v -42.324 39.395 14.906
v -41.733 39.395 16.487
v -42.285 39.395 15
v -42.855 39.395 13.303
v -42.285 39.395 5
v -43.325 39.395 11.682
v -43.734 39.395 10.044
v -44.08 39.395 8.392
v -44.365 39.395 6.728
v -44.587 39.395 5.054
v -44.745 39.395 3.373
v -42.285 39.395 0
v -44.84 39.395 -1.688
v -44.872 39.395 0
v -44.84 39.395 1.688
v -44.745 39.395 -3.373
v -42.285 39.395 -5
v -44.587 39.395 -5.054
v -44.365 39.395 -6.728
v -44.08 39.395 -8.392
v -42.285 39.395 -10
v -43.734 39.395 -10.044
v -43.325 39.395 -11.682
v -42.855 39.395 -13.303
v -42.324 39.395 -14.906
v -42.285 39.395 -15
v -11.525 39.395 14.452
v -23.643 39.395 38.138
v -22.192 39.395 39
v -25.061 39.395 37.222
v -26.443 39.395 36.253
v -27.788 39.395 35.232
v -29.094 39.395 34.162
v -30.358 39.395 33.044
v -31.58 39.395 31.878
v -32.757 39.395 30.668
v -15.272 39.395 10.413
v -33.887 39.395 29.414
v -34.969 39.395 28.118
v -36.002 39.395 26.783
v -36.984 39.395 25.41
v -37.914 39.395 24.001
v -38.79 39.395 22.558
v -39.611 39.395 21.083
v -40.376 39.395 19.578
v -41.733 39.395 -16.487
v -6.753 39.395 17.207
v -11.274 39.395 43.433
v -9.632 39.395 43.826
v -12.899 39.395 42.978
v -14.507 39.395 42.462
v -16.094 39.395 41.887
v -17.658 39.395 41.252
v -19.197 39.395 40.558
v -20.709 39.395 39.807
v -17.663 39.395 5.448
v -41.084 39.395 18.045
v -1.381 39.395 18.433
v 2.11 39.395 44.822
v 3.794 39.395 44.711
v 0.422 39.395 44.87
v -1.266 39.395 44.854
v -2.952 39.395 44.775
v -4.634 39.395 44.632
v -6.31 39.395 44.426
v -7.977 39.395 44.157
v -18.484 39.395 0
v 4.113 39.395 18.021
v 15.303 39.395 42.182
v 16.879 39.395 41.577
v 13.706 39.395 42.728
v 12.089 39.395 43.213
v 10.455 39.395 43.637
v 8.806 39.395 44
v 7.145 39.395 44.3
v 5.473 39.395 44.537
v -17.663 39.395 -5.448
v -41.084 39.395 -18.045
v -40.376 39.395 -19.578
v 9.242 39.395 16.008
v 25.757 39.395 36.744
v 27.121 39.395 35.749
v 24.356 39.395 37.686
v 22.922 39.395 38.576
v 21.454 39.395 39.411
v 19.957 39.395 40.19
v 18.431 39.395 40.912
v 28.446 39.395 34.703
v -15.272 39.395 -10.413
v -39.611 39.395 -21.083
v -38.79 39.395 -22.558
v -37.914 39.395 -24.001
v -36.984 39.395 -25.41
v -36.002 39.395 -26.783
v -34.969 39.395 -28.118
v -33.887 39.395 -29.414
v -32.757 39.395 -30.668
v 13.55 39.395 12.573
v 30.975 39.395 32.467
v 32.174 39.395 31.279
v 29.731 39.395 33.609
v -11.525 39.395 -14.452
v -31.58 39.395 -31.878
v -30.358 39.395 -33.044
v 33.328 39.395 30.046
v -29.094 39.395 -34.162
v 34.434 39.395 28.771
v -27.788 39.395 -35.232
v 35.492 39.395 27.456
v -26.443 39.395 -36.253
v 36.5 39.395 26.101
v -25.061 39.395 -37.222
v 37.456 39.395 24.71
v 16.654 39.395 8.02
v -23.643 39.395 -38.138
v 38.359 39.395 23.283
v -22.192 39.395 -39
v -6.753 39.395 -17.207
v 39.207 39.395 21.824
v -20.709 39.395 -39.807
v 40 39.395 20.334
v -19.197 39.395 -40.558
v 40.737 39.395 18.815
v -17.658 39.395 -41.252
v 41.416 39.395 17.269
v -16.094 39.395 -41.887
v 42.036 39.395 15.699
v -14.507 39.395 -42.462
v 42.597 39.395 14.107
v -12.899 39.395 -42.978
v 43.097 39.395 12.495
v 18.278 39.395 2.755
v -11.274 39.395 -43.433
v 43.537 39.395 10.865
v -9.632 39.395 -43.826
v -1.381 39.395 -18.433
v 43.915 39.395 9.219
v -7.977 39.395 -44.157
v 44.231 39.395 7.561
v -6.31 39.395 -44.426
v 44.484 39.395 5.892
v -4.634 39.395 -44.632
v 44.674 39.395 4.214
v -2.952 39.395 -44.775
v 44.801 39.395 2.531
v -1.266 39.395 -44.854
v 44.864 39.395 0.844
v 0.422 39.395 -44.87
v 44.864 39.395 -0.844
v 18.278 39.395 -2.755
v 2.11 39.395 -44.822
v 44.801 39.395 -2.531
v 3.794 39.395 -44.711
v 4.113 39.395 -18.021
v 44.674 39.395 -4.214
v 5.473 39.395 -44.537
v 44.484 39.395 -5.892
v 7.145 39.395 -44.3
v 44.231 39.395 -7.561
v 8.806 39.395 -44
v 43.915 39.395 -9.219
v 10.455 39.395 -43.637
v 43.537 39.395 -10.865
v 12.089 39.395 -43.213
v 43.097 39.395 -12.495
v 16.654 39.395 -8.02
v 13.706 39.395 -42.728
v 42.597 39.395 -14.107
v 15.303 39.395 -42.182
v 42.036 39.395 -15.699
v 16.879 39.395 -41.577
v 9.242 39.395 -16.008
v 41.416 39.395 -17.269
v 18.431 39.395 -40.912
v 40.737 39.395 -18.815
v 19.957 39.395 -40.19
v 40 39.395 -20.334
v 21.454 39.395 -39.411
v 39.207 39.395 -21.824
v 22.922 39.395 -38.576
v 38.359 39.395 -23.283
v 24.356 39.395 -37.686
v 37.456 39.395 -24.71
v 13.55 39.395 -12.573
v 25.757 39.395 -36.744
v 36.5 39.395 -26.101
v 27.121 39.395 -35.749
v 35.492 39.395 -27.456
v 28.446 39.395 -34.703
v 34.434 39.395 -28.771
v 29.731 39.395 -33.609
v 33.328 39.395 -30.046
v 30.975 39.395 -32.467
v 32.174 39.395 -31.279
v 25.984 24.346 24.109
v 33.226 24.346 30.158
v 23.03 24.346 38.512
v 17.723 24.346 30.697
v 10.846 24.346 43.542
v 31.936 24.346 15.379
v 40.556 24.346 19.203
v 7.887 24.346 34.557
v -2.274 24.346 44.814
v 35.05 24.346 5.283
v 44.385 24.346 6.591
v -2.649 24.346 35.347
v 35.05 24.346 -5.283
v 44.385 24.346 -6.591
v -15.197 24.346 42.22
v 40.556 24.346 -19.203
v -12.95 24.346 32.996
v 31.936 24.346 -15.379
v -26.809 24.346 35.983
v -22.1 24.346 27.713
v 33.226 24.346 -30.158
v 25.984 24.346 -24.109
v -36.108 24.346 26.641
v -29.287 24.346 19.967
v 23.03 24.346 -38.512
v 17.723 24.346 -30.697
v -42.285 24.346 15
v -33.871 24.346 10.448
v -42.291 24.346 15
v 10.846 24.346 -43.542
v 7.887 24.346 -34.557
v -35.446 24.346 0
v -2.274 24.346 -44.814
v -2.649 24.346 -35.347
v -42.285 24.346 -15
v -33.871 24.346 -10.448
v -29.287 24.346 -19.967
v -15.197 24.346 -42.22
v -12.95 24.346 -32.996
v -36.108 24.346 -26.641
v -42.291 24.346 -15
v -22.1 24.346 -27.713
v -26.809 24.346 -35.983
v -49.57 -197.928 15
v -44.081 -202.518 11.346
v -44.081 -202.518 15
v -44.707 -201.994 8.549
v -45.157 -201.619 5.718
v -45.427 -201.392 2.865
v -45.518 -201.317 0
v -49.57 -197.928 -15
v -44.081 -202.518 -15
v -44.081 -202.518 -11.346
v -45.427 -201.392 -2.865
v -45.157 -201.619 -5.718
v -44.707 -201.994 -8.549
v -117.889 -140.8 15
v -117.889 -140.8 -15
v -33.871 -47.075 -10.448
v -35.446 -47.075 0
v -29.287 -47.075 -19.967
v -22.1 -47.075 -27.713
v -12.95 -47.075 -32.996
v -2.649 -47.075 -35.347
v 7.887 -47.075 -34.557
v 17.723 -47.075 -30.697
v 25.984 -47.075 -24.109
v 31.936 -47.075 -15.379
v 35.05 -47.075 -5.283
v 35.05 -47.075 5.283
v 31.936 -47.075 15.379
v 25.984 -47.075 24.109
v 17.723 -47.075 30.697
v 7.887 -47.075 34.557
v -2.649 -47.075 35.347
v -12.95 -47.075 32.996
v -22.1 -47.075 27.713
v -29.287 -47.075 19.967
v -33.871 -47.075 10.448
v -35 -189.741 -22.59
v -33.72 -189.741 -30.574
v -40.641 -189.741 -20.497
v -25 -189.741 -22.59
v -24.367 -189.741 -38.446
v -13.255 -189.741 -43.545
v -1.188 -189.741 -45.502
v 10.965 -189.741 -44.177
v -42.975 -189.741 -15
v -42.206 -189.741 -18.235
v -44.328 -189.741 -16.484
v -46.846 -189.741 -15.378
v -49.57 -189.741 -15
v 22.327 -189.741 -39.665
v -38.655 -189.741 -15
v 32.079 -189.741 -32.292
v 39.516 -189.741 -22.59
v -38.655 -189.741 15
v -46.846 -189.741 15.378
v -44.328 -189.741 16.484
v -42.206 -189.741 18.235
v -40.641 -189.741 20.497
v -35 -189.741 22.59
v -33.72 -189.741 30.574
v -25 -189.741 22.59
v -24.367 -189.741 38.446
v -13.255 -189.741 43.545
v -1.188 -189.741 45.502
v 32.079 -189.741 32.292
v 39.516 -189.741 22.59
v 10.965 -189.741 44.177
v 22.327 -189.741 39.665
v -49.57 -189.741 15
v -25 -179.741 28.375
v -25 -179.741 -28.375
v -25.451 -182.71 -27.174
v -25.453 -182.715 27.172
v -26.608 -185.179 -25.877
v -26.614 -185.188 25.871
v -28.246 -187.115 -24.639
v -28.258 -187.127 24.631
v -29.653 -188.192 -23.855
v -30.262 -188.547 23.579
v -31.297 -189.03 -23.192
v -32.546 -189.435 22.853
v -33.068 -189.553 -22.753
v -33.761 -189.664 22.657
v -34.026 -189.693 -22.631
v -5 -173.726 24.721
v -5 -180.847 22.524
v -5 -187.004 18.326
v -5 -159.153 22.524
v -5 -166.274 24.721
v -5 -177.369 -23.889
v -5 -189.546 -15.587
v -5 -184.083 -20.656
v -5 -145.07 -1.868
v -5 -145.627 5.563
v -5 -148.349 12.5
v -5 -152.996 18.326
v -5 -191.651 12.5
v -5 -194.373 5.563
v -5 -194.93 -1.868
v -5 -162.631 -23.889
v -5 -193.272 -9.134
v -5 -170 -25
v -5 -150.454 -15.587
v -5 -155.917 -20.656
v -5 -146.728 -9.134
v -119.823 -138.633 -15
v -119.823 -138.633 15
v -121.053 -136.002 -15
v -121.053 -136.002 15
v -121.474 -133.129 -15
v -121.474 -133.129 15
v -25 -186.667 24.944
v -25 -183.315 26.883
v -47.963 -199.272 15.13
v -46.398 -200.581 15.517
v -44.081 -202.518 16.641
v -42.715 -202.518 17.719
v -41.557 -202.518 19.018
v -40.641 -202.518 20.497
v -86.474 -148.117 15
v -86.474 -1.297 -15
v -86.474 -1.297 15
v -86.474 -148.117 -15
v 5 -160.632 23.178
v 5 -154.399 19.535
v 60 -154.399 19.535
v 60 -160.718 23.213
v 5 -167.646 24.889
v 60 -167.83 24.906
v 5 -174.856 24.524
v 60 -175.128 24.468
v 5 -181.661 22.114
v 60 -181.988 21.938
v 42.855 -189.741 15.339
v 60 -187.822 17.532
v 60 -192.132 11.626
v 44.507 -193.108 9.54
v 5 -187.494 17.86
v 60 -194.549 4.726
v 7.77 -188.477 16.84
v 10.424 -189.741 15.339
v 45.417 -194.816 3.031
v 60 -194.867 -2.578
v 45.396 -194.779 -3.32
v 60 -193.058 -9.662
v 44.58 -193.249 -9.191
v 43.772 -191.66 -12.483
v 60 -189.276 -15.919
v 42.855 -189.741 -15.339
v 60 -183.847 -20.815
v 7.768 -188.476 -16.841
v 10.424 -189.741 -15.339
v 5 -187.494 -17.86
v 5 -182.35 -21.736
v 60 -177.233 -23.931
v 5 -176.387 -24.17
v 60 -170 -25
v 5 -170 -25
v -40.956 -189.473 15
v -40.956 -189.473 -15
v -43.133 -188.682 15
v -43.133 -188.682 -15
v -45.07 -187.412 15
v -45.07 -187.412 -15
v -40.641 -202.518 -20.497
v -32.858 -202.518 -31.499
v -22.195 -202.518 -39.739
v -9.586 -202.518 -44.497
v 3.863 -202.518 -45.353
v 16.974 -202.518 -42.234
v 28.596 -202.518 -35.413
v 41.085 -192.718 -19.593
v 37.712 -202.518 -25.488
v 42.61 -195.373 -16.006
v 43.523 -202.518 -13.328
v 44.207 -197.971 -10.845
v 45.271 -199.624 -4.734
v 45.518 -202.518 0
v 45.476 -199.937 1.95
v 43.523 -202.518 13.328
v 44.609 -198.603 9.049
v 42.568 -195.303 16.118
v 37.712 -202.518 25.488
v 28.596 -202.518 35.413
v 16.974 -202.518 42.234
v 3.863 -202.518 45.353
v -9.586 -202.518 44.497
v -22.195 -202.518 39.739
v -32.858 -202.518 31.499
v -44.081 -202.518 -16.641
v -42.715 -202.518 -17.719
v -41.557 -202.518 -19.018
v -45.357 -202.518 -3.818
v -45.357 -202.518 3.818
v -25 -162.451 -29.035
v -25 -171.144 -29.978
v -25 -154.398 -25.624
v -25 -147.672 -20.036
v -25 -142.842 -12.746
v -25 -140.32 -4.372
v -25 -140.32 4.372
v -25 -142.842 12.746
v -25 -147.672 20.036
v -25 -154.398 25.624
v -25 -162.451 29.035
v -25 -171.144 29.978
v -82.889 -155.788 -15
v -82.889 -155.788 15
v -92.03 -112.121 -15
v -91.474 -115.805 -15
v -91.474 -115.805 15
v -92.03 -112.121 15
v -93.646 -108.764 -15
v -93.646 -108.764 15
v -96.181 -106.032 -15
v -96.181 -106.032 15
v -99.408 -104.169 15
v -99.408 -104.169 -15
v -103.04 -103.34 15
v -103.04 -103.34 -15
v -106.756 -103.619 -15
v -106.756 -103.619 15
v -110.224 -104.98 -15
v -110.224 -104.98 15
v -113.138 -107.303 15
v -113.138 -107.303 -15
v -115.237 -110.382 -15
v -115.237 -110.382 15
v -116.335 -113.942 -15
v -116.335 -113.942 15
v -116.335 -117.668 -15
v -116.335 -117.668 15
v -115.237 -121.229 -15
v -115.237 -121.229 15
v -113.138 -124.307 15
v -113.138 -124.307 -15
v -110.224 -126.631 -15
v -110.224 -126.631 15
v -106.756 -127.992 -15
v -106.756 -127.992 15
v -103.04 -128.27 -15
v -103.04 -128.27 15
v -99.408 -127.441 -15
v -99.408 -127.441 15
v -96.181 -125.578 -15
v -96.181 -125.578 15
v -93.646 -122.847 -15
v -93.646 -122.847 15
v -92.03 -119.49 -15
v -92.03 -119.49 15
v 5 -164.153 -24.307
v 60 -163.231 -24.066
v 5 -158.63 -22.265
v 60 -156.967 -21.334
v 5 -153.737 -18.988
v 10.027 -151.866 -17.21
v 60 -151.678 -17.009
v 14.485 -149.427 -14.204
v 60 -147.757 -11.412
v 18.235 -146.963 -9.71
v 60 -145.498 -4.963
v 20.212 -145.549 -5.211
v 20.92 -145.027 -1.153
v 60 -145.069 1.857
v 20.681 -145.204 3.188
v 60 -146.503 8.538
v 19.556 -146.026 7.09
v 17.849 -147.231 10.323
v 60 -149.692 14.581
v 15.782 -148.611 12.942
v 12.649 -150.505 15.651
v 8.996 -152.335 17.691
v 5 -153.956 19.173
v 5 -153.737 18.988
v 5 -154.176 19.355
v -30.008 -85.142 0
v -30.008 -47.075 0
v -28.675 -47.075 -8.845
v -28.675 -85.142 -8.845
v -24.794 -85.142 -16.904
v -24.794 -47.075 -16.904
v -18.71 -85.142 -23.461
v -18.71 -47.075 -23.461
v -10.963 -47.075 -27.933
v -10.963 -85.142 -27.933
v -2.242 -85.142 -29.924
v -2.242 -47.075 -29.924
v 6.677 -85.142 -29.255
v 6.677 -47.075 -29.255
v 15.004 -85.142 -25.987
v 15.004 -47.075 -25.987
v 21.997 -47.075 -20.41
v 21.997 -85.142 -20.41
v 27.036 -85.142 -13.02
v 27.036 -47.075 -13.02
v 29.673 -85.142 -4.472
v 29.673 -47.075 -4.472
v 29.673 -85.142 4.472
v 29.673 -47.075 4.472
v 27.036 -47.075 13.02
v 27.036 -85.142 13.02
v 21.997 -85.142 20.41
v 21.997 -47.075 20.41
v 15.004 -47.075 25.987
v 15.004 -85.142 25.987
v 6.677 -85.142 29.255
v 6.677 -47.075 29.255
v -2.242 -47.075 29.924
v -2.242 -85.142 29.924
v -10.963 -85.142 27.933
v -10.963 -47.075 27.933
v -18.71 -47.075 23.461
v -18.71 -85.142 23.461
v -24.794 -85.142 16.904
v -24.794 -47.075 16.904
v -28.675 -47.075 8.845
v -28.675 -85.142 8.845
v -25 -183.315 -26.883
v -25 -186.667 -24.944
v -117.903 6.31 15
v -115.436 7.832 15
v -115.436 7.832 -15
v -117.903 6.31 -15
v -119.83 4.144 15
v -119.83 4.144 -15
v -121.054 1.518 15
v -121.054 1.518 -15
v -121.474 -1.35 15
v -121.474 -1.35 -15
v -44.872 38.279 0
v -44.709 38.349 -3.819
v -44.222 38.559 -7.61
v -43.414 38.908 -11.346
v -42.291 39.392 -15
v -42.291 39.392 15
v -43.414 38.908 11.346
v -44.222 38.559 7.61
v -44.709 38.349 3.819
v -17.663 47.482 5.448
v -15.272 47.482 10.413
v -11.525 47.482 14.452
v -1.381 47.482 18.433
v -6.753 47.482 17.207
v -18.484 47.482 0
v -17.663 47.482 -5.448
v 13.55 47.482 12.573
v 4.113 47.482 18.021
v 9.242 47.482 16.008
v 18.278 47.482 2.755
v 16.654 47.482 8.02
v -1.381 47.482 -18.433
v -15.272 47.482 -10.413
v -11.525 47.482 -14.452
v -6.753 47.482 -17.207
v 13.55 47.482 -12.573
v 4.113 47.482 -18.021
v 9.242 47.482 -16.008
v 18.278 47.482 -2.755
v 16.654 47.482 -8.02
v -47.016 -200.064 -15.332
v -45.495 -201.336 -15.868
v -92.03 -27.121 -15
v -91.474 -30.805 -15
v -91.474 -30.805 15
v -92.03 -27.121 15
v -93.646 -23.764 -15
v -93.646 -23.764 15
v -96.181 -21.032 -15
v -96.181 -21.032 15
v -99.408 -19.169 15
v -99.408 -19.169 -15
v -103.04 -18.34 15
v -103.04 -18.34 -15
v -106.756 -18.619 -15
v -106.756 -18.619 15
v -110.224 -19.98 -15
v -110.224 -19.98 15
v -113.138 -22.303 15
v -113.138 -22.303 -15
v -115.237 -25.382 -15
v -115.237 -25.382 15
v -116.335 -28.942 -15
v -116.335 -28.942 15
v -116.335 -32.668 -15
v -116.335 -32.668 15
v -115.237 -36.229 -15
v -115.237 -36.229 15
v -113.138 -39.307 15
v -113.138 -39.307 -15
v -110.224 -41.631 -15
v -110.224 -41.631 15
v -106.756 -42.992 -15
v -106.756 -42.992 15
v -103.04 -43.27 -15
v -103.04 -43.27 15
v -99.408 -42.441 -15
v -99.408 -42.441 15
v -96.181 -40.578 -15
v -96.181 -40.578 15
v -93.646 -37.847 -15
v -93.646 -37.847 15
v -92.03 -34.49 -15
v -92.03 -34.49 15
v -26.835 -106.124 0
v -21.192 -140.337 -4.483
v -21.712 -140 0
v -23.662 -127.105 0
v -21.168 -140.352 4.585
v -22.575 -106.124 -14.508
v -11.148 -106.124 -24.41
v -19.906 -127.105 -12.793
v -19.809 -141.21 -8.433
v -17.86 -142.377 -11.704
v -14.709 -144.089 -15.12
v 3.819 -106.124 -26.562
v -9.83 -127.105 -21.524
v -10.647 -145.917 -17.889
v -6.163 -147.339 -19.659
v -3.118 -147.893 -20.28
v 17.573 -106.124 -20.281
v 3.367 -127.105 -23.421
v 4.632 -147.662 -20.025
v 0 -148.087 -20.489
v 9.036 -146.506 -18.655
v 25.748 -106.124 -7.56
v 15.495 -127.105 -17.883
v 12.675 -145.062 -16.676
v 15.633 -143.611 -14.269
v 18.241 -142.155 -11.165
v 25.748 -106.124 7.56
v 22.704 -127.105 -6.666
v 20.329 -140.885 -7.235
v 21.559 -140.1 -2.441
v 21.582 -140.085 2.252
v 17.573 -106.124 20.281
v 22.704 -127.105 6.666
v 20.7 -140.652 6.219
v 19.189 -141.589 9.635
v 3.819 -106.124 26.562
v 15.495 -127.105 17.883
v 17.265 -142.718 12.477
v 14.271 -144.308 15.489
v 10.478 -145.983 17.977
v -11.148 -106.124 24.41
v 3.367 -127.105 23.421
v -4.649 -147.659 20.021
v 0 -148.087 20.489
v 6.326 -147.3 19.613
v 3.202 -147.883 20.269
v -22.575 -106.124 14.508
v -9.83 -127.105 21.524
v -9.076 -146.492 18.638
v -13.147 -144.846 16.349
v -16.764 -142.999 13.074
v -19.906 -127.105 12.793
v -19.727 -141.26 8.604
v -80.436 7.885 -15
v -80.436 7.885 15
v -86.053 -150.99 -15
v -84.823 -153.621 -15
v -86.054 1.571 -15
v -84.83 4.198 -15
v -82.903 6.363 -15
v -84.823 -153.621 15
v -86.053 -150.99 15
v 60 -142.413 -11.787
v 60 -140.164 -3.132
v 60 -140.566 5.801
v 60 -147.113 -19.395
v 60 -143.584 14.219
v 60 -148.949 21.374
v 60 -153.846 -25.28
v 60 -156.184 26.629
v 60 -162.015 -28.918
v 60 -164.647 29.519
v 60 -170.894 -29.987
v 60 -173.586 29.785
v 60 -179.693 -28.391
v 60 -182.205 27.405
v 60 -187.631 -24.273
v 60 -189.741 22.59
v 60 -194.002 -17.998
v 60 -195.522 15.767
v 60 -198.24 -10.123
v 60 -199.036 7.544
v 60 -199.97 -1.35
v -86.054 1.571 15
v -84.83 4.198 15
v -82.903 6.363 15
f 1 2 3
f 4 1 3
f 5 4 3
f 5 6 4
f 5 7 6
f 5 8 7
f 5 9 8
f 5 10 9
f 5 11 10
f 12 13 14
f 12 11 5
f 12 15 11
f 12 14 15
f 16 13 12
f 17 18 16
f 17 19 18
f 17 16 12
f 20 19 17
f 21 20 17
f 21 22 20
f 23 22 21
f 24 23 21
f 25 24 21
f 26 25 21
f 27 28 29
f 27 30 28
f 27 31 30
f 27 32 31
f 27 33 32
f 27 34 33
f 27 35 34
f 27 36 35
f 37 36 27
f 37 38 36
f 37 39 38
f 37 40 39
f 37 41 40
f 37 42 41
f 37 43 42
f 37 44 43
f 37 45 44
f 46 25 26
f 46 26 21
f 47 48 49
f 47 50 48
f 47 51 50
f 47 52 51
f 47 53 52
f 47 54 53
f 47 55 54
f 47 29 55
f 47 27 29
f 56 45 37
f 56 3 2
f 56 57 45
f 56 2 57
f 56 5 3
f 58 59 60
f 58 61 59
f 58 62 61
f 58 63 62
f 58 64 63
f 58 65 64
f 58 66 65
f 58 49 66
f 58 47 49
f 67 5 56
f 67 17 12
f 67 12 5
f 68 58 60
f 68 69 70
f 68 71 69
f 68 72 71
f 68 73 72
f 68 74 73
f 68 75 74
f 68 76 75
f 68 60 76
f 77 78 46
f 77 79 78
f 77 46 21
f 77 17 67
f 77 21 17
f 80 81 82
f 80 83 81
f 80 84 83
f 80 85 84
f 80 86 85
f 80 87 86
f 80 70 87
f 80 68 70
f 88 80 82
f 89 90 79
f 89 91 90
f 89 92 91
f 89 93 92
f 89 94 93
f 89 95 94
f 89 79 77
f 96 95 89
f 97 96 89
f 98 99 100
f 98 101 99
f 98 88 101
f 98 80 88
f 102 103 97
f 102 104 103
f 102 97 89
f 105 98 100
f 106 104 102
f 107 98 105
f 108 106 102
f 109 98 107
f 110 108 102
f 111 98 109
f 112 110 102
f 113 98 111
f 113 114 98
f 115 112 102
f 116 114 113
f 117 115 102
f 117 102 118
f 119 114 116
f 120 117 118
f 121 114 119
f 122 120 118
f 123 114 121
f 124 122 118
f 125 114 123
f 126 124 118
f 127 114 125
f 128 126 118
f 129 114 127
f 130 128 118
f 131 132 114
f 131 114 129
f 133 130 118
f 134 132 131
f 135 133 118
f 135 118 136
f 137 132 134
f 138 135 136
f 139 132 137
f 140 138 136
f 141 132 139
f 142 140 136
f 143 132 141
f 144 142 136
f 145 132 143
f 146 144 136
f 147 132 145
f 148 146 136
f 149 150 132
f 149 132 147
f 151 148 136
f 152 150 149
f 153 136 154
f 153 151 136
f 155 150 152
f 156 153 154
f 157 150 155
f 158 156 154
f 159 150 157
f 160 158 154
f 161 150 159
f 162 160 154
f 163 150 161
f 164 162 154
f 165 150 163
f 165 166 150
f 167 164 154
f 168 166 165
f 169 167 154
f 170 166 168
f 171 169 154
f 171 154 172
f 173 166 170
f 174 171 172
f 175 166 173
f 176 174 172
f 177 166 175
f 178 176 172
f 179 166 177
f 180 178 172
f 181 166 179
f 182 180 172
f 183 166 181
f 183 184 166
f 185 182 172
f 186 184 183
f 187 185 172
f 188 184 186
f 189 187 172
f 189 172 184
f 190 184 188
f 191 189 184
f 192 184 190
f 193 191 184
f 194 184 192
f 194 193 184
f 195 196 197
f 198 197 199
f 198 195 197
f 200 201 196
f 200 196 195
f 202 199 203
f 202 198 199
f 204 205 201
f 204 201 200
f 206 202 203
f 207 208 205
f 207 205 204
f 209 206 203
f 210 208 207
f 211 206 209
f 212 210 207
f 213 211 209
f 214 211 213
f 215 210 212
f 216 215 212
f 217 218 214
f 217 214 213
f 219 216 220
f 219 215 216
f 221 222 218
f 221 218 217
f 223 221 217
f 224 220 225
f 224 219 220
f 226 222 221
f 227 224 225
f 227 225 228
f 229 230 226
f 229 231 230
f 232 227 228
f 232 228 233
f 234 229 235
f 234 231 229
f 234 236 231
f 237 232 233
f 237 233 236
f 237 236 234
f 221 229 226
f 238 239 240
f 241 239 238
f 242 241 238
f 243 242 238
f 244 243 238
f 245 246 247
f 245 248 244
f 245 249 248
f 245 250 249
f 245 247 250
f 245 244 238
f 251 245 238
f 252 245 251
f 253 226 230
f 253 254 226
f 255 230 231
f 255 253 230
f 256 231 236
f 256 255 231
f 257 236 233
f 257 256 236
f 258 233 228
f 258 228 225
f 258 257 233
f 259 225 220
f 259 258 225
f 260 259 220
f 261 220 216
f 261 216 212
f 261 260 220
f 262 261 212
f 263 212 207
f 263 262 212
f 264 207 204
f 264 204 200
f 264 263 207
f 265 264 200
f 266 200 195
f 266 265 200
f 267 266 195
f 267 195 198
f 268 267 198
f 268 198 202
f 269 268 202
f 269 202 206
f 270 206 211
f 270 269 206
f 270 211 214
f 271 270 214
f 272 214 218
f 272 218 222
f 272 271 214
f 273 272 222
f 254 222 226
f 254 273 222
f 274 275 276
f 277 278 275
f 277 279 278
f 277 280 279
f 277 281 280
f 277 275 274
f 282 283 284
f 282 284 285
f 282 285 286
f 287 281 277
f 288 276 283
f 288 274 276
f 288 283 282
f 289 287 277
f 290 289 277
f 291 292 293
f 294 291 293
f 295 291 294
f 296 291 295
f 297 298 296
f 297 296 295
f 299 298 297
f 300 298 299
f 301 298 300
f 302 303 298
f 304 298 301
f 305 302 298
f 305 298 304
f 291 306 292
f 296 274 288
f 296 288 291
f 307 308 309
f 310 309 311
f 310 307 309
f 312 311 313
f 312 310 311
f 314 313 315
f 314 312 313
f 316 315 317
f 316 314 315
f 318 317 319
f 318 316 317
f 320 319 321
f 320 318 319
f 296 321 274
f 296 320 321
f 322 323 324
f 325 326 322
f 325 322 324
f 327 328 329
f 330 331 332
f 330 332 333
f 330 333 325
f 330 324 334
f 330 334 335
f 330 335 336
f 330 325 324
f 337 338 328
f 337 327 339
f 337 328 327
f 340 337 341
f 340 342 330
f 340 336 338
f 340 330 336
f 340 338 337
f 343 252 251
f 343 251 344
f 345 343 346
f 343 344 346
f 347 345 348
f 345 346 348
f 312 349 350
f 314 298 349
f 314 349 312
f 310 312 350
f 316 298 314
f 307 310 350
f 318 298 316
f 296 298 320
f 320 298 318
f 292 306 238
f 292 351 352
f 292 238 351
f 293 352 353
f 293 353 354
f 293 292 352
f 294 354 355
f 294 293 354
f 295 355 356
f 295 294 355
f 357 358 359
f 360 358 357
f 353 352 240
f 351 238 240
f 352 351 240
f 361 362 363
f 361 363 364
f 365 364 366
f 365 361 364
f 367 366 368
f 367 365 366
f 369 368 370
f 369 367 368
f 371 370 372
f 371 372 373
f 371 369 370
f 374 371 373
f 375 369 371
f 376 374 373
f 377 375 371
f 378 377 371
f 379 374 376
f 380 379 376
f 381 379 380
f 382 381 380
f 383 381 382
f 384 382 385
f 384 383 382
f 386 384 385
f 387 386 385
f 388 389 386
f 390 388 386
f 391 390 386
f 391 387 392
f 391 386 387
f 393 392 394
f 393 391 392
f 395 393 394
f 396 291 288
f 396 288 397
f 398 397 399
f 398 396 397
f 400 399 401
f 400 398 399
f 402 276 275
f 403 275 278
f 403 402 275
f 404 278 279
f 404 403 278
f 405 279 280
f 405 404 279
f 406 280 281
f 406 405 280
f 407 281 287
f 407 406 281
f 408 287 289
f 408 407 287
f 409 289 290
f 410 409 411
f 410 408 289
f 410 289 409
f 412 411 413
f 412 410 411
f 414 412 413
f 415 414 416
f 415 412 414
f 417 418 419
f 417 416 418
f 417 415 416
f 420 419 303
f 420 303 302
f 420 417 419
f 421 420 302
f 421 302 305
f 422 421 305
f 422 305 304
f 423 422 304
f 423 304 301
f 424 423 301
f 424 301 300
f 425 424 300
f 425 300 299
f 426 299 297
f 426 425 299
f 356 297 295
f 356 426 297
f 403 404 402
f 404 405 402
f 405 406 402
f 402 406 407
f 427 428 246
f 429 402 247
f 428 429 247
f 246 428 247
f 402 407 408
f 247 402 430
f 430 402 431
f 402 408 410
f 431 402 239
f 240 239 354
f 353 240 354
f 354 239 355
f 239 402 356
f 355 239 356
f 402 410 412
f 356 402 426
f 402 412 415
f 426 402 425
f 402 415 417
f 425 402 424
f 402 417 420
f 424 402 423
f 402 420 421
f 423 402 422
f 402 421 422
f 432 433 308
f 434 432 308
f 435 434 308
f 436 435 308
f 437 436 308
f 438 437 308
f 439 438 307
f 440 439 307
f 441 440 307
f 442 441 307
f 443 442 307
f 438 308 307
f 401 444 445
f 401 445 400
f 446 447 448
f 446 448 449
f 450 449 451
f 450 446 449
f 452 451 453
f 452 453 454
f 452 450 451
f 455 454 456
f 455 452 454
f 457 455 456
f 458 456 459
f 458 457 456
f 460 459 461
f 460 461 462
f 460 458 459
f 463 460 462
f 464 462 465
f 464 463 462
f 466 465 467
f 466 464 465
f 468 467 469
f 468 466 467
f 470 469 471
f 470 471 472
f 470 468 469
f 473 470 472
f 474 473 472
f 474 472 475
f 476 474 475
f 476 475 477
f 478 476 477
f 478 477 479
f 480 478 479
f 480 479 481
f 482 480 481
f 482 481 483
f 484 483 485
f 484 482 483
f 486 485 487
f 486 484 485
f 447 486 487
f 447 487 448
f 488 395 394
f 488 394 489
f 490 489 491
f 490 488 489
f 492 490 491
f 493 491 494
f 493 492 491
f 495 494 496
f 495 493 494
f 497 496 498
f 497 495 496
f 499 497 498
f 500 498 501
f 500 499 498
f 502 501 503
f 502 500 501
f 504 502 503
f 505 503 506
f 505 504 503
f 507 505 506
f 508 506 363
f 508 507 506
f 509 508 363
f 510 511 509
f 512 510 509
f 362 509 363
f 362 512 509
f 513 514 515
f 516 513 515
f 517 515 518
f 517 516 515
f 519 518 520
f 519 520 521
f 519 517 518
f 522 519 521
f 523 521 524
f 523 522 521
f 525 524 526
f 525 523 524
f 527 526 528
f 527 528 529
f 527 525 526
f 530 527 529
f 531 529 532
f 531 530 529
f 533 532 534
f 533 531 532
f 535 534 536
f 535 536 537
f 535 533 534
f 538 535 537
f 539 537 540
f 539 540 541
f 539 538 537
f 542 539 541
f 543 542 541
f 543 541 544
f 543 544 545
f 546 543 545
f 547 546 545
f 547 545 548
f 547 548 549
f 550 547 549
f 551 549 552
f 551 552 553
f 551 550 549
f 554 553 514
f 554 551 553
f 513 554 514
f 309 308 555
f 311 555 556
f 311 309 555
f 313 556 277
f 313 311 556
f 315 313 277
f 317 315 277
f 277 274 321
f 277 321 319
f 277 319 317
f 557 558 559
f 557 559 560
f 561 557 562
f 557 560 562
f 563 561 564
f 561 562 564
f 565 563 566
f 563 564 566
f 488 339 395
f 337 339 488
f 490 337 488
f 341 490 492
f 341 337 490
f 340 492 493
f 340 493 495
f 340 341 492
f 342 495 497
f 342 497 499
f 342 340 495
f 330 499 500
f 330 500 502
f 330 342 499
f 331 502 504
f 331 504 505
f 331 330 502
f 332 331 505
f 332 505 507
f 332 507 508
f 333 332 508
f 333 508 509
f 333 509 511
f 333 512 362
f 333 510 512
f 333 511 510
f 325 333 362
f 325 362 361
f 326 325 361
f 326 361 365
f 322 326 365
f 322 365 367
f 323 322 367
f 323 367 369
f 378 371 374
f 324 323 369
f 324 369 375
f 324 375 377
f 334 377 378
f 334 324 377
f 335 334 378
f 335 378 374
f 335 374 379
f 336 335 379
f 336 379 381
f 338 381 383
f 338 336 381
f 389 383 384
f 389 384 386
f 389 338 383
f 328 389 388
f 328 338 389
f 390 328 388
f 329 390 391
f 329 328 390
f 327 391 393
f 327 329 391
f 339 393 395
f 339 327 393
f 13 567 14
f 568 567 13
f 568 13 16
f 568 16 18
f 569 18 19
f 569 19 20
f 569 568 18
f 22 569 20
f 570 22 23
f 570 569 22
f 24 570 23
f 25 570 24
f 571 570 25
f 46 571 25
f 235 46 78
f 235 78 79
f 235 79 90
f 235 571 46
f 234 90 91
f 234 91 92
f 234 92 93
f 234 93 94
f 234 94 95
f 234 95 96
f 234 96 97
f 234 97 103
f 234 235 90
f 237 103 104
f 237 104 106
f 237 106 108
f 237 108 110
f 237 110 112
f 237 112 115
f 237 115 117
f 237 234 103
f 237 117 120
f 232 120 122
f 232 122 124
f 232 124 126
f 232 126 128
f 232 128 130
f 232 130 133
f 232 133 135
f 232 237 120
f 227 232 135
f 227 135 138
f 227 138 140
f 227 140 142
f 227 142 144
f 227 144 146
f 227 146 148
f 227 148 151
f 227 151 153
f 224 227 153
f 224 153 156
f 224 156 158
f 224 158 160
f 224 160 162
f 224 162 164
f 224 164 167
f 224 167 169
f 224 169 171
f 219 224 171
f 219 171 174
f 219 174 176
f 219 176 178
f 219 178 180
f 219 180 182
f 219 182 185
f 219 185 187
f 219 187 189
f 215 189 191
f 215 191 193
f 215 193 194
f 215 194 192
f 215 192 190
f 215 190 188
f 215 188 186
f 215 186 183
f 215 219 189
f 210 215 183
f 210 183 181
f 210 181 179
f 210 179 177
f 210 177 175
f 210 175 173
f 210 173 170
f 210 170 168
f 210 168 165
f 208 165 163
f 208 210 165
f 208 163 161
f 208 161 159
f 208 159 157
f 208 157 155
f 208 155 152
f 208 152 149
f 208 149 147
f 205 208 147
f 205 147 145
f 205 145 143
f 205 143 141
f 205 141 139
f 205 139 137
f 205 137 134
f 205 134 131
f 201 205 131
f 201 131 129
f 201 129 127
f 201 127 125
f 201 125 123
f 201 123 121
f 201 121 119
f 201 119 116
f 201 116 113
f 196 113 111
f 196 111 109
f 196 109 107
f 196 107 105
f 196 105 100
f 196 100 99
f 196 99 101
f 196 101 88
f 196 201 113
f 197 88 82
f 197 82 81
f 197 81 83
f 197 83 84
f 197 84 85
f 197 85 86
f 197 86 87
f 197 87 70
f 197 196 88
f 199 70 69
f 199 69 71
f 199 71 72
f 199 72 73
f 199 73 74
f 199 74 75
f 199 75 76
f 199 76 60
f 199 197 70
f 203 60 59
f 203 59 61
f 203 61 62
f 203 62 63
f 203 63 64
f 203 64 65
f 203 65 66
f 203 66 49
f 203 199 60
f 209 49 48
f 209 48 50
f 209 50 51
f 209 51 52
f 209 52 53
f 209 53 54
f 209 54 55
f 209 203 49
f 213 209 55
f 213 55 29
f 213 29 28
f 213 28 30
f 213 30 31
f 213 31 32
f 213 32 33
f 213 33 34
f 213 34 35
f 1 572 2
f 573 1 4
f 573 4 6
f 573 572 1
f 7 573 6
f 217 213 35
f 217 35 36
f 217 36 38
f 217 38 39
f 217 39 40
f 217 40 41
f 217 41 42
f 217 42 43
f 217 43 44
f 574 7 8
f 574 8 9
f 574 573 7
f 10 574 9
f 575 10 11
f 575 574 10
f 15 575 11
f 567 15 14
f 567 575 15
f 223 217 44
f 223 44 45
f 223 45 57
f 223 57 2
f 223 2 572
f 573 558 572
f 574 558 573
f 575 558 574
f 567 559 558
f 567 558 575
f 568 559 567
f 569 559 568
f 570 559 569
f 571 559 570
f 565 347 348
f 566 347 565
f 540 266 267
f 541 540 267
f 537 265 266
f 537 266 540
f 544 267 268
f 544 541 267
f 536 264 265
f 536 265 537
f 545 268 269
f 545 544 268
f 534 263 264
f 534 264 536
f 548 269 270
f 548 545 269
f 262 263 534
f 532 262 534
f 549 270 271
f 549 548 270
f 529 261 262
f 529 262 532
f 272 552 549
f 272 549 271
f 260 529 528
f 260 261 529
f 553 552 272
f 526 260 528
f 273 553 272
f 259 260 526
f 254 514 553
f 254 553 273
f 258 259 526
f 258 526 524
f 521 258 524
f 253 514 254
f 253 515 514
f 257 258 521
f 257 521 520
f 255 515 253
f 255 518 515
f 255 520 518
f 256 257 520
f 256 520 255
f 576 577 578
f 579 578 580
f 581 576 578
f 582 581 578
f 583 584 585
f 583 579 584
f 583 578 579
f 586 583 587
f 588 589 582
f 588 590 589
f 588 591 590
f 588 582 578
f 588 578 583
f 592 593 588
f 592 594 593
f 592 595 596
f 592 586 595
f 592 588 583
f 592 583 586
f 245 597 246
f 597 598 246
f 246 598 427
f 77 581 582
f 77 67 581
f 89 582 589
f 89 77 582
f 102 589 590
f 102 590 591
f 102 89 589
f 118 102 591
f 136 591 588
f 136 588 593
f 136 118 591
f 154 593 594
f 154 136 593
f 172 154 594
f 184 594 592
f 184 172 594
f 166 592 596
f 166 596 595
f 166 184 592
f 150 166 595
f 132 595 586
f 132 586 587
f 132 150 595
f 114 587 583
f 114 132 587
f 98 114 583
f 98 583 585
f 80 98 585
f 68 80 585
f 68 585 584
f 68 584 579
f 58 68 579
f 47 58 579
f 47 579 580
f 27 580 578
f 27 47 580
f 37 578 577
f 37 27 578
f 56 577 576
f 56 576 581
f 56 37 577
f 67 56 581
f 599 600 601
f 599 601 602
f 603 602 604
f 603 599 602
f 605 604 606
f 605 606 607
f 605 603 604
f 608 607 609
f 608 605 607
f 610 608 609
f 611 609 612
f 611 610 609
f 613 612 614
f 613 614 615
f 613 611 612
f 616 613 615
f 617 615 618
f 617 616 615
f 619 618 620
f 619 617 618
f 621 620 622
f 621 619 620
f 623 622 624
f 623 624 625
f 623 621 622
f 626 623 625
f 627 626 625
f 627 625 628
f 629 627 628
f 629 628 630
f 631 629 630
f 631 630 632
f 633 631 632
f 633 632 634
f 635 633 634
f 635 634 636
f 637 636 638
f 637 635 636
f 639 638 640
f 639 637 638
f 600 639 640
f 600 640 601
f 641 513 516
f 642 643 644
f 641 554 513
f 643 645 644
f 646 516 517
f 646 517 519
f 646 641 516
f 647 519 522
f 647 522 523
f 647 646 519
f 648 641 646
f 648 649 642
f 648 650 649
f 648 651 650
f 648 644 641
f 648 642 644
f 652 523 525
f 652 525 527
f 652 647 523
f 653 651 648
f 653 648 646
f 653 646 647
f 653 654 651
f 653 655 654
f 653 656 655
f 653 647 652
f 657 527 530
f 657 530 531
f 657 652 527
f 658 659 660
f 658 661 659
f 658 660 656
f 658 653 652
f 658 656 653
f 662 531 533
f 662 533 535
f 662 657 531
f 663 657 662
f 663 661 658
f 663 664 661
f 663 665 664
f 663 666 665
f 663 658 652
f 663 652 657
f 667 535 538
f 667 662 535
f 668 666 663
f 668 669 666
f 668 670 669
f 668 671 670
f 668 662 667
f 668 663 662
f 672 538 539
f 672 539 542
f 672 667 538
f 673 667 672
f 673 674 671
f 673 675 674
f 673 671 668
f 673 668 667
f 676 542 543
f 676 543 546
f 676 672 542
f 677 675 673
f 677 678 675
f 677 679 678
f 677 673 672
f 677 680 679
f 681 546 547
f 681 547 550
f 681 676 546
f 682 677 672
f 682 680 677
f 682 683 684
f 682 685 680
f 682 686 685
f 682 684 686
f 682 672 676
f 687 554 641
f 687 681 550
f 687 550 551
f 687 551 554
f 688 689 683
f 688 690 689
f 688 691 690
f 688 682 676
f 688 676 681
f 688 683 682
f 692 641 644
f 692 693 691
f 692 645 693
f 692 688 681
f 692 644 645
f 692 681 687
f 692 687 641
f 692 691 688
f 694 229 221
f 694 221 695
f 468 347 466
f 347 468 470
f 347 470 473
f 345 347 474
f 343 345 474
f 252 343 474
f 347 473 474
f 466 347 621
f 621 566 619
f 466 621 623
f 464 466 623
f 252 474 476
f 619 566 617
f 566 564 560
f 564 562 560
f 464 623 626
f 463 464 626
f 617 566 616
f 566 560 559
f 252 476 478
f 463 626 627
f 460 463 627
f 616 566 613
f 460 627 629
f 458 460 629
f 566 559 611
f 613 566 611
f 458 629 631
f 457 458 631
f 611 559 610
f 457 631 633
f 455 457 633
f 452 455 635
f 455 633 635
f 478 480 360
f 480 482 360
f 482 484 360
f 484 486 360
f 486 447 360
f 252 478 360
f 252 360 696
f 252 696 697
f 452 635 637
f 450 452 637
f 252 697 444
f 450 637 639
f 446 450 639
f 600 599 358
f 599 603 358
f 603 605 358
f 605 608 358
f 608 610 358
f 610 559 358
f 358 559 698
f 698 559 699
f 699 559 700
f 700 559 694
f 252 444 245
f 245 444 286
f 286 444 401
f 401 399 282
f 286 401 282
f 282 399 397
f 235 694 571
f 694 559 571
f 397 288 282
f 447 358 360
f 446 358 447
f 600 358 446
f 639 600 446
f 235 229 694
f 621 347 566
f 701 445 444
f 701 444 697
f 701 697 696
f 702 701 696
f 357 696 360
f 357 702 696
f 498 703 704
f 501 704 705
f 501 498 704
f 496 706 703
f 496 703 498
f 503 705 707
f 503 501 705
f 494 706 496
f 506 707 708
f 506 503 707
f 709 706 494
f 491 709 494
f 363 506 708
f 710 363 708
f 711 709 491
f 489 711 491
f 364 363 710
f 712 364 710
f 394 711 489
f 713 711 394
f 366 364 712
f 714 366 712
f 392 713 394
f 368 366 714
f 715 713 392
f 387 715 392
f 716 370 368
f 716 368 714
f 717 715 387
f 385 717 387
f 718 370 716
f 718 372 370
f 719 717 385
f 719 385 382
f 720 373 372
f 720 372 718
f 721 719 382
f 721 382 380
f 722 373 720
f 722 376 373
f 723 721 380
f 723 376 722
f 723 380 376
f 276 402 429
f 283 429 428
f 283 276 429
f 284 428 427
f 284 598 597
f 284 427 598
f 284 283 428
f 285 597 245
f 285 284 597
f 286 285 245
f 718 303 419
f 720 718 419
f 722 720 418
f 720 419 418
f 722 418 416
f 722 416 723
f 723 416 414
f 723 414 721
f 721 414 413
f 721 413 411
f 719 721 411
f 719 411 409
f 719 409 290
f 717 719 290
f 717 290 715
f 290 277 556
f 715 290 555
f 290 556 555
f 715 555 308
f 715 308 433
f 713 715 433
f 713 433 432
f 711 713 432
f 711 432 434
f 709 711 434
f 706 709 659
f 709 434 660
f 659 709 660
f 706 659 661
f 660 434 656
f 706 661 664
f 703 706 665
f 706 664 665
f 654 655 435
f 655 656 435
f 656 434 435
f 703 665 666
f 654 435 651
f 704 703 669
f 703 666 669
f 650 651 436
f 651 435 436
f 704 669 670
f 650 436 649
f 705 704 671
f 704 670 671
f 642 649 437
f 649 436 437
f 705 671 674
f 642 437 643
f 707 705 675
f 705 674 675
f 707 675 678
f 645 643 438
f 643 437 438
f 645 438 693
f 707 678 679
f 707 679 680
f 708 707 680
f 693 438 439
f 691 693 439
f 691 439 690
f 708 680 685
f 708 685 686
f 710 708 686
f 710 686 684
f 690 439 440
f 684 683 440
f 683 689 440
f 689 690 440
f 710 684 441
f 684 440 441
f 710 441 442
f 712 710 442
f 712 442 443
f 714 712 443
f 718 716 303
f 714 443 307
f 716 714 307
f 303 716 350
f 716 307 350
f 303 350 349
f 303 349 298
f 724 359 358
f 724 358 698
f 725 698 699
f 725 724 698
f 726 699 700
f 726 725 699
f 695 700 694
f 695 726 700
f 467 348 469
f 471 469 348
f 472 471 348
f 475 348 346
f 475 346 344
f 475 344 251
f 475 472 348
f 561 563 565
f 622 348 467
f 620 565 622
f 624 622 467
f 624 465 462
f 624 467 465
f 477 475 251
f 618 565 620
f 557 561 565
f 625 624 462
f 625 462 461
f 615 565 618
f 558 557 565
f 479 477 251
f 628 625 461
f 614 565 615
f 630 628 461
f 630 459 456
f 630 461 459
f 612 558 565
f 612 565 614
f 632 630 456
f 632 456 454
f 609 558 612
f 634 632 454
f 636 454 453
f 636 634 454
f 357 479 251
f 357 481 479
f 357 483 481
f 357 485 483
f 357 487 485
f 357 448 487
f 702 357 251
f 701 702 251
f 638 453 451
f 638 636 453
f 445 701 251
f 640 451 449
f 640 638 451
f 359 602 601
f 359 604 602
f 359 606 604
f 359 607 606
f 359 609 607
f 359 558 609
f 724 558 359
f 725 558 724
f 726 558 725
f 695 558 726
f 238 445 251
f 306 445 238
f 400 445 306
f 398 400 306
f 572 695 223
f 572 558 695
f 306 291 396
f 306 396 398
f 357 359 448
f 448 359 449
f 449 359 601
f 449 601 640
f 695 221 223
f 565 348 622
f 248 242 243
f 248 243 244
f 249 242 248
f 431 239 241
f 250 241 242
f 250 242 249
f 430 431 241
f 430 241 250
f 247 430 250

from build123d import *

# Parameters (mm, degrees)
BOSS_EXTRUDE1_DEPTH      = 15
BOSS_EXTRUDE1_DEPTH_BACK = 15
SKETCH3_R                = 12.5
SKETCH4_R                = 30
SKETCH4_R_2              = 25
BOSS_EXTRUDE2_DEPTH      = 60
BOSS_EXTRUDE3_DEPTH      = 5
BOSS_EXTRUDE3_DEPTH_BACK = 25
SKETCH5_R                = 30
FILLET1_R                = 10
CUT_EXTRUDE1_START       = -65
SKETCH6_R                = 25
CUT_EXTRUDE1_DEPTH       = 65


with BuildPart() as part:
    # Sketch2 → Revolve1 (revolve)
    with BuildSketch(Plane.XY, mode=Mode.PRIVATE) as revolve1_sk:
        Polygon((0, 47.481515712), (18.484288355, 47.481515712), (18.484288355, 39.394639556), (44.872104392, 39.394639556), (44.872104392, 24.346445364), (35.445928293, 24.346445364), (35.445928293, -47.074965844), (30.007749775, -47.074965844), (30.007749775, -85.142215473), (18.546286043, -160.936690765), (18.546286043, -189.740958038), (45.517560074, -189.740958038), (45.517560074, -202.518484288), (0, -202.518484288), align=None)
    revolve(revolve1_sk.sketch.rotate(Axis((0, 47.481515712, 0), (0, -1, 0)), 180), axis=Axis((0, 47.481515712, 0), (0, -1, 0)))

    # Sketch3 → Boss-Extrude1 (add, two sides: drawn at the far end of the back side and taken through both)
    with BuildSketch(Plane.XY.offset(-BOSS_EXTRUDE1_DEPTH_BACK)):
        Polygon((-42.28533841, 24.346445364), (-86.474429819, 5.279737536), (-86.474429819, -152.790196511), (-42.28533841, -189.740958038), (-42.28533841, -202.518484288), (-44.080740722, -202.518484288), (-121.474429819, -137.802155929), (-121.474429819, 5.226132785), (-42.28533841, 39.394639556), align=None)
        with Locations((-103.974429819, -30.80530006)):
            Circle(SKETCH3_R, mode=Mode.SUBTRACT)
        with Locations((-103.974429819, -115.80530006)):
            Circle(SKETCH3_R, mode=Mode.SUBTRACT)
    extrude(amount=BOSS_EXTRUDE1_DEPTH + BOSS_EXTRUDE1_DEPTH_BACK)

    # Sketch4 → Boss-Extrude2 (add)
    with BuildSketch(Plane(origin=(0, 0, 0), x_dir=(0, 0, -1), z_dir=(1, 0, 0))):
        with Locations(Location((0, -170, 0), (0, 0, 221.149949101))):
            Circle(SKETCH4_R)
        with Locations(Location((0, -170, 0), (0, 0, 141.388518695))):
            Circle(SKETCH4_R_2, mode=Mode.SUBTRACT)
    extrude(amount=BOSS_EXTRUDE2_DEPTH)

    # Sketch5 → Boss-Extrude3 (add, two sides: drawn at the far end of the back side and taken through both)
    with BuildSketch(Plane(origin=(0, 0, 0), x_dir=(0, 0, -1), z_dir=(1, 0, 0)).offset(-BOSS_EXTRUDE3_DEPTH_BACK)):
        with Locations(Location((0, -170, 0), (0, 0, 221.149949101))):
            Circle(SKETCH5_R)
    extrude(amount=BOSS_EXTRUDE3_DEPTH + BOSS_EXTRUDE3_DEPTH_BACK)

    # Fillet1
    # the kernel refuses this fillet: 10 mm, written as the material it adds along each edge
    with BuildSketch(Plane(origin=(-42.974972659, -189.740958038, 15), x_dir=(-1, 0, 0), z_dir=(0, -1, 0))) as fillet1_piece_1_section:
        with BuildLine():
            CenterArc((6.59517437, -10), FILLET1_R, 90, 63.23655504)
            ThreePointArc((-2.333558622, -5.49692026), (-1.076535169, -2.786770672), (0, 0))
            Line((0, 0), (6.59517437, 0))
        make_face()
    fillet1_piece_1 = extrude(amount=12.777526251, mode=Mode.PRIVATE)
    fillet1_piece_1 = split(fillet1_piece_1, bisect_by=Plane(origin=(-48.522573574, -198.80423941, 19.040168561), z_dir=(0.6414797327096047, 0.7671399823518614, 0)), keep=Keep.TOP, mode=Mode.PRIVATE)
    add(fillet1_piece_1)
    with BuildSketch(Plane(origin=(-42.974972659, -189.740958038, -15), x_dir=(0.3907672257300362, 0, -0.9204895302474932), z_dir=(0, -1, 0))) as fillet1_piece_2_section:
        with BuildLine():
            CenterArc((6.627717311, -9.978461215), FILLET1_R, 93.76119811, 63.23655504)
            Line((-2.577177992, -6.070788958), (0, 0))
            ThreePointArc((0, 0), (2.985867888, -0.098039292), (5.971735777, 0))
        make_face()
    fillet1_piece_2 = extrude(amount=12.777526251, mode=Mode.PRIVATE)
    fillet1_piece_2 = split(fillet1_piece_2, bisect_by=Plane(origin=(-48.522573573, -198.80423941, -19.04016856), z_dir=(0.6414797327096047, 0.7671399823518614, 0)), keep=Keep.TOP, mode=Mode.PRIVATE)
    add(fillet1_piece_2)
    with BuildSketch(Plane(origin=(-86.474429819, 5.279737536, 15), x_dir=(0.9181753374265987, 0.39617426688460156, 0), z_dir=(0, 0, -1))) as fillet1_piece_3:
        with BuildLine():
            CenterArc((FILLET1_R * 0.657636628324, FILLET1_R), FILLET1_R, 203.339230224, 66.660769776)
            Line((-FILLET1_R * 0.260538709103, FILLET1_R * 0.603825733115), (0, 0))
            Line((0, 0), (FILLET1_R * 0.657636628324, 0))
        make_face()
    extrude(amount=30)
    with BuildSketch(Plane(origin=(-86.474429819, -152.790196511, 15), x_dir=(0, 1, 0), z_dir=(0, 0, -1))) as fillet1_piece_4:
        with BuildLine():
            CenterArc((FILLET1_R * 0.467346606276, FILLET1_R), FILLET1_R, 219.902248143, 50.097751857)
            Line((-FILLET1_R * 0.299793376076, FILLET1_R * 0.35852026729), (0, 0))
            Line((0, 0), (FILLET1_R * 0.467346606276, 0))
        make_face()
    extrude(amount=30)
    with BuildSketch(Plane(origin=(-42.28533841, -189.740958038, 15), x_dir=(-0.7671399823518606, 0.6414797327096056, 0), z_dir=(0, 0, -1))) as fillet1_piece_5:
        with BuildLine():
            CenterArc((FILLET1_R * 0.363004481318, FILLET1_R), FILLET1_R, 230.097751857, 39.902248143)
            Line((-FILLET1_R * 0.278475251392, FILLET1_R * 0.232860017648), (0, 0))
            Line((0, 0), (FILLET1_R * 0.363004481318, 0))
        make_face()
    extrude(amount=30)
    with BuildSketch(Plane(origin=(-25, -189.740958038, 47.589700656), x_dir=(-1, 0, 0), z_dir=(0, 0, -1))) as fillet1_piece_6_section:
        with BuildLine():
            CenterArc((FILLET1_R, FILLET1_R), FILLET1_R, 180, 90)
            Line((0, FILLET1_R), (0, 0))
            Line((0, 0), (FILLET1_R, 0))
        make_face()
    fillet1_piece_6 = extrude(amount=95.179401313, mode=Mode.PRIVATE)
    fillet1_piece_6 = fillet1_piece_6 & Plane(origin=(-27.186425599, -170, 0), x_dir=(0, -0.6580319345943207, 0.7529900218821333), z_dir=(-1, 0, 0)) * Cylinder(30, 231, mode=Mode.PRIVATE)
    add(fillet1_piece_6)
    # the kernel refuses this fillet: 10 mm, written as the material it takes off along each edge
    with BuildSketch(Plane(origin=(-121.474429819, -137.802155929, 26.683665157), x_dir=(0, 1, 0), z_dir=(0, 0, -1))) as fillet1_2_piece_1:
        with BuildLine():
            CenterArc((FILLET1_R * 0.467346606276, FILLET1_R), FILLET1_R, 219.902248143, 50.097751857)
            Line((-FILLET1_R * 0.299793376076, FILLET1_R * 0.35852026729), (0, 0))
            Line((0, 0), (FILLET1_R * 0.467346606276, 0))
        make_face()
    extrude(amount=53.367330314, mode=Mode.SUBTRACT)
    with BuildSketch(Plane(origin=(-121.474429819, 5.226132785, -31.440915708), x_dir=(0, -1, 0), z_dir=(0, 0, 1))) as fillet1_2_piece_2:
        with BuildLine():
            CenterArc((FILLET1_R * 0.657636628324, FILLET1_R), FILLET1_R, 203.339230224, 66.660769776)
            Line((-FILLET1_R * 0.260538709103, FILLET1_R * 0.603825733115), (0, 0))
            Line((0, 0), (FILLET1_R * 0.657636628324, 0))
        make_face()
    extrude(amount=62.881831416, mode=Mode.SUBTRACT)

    # Sketch6 → Cut-Extrude1 (cut)
    with BuildSketch(Plane(origin=(60, 0, 0), x_dir=(0, 0, -1), z_dir=(1, 0, 0)).offset(CUT_EXTRUDE1_START)):
        with Locations((0, -170)):
            Circle(SKETCH6_R)
    extrude(amount=CUT_EXTRUDE1_DEPTH, mode=Mode.SUBTRACT)


solid = part.part
